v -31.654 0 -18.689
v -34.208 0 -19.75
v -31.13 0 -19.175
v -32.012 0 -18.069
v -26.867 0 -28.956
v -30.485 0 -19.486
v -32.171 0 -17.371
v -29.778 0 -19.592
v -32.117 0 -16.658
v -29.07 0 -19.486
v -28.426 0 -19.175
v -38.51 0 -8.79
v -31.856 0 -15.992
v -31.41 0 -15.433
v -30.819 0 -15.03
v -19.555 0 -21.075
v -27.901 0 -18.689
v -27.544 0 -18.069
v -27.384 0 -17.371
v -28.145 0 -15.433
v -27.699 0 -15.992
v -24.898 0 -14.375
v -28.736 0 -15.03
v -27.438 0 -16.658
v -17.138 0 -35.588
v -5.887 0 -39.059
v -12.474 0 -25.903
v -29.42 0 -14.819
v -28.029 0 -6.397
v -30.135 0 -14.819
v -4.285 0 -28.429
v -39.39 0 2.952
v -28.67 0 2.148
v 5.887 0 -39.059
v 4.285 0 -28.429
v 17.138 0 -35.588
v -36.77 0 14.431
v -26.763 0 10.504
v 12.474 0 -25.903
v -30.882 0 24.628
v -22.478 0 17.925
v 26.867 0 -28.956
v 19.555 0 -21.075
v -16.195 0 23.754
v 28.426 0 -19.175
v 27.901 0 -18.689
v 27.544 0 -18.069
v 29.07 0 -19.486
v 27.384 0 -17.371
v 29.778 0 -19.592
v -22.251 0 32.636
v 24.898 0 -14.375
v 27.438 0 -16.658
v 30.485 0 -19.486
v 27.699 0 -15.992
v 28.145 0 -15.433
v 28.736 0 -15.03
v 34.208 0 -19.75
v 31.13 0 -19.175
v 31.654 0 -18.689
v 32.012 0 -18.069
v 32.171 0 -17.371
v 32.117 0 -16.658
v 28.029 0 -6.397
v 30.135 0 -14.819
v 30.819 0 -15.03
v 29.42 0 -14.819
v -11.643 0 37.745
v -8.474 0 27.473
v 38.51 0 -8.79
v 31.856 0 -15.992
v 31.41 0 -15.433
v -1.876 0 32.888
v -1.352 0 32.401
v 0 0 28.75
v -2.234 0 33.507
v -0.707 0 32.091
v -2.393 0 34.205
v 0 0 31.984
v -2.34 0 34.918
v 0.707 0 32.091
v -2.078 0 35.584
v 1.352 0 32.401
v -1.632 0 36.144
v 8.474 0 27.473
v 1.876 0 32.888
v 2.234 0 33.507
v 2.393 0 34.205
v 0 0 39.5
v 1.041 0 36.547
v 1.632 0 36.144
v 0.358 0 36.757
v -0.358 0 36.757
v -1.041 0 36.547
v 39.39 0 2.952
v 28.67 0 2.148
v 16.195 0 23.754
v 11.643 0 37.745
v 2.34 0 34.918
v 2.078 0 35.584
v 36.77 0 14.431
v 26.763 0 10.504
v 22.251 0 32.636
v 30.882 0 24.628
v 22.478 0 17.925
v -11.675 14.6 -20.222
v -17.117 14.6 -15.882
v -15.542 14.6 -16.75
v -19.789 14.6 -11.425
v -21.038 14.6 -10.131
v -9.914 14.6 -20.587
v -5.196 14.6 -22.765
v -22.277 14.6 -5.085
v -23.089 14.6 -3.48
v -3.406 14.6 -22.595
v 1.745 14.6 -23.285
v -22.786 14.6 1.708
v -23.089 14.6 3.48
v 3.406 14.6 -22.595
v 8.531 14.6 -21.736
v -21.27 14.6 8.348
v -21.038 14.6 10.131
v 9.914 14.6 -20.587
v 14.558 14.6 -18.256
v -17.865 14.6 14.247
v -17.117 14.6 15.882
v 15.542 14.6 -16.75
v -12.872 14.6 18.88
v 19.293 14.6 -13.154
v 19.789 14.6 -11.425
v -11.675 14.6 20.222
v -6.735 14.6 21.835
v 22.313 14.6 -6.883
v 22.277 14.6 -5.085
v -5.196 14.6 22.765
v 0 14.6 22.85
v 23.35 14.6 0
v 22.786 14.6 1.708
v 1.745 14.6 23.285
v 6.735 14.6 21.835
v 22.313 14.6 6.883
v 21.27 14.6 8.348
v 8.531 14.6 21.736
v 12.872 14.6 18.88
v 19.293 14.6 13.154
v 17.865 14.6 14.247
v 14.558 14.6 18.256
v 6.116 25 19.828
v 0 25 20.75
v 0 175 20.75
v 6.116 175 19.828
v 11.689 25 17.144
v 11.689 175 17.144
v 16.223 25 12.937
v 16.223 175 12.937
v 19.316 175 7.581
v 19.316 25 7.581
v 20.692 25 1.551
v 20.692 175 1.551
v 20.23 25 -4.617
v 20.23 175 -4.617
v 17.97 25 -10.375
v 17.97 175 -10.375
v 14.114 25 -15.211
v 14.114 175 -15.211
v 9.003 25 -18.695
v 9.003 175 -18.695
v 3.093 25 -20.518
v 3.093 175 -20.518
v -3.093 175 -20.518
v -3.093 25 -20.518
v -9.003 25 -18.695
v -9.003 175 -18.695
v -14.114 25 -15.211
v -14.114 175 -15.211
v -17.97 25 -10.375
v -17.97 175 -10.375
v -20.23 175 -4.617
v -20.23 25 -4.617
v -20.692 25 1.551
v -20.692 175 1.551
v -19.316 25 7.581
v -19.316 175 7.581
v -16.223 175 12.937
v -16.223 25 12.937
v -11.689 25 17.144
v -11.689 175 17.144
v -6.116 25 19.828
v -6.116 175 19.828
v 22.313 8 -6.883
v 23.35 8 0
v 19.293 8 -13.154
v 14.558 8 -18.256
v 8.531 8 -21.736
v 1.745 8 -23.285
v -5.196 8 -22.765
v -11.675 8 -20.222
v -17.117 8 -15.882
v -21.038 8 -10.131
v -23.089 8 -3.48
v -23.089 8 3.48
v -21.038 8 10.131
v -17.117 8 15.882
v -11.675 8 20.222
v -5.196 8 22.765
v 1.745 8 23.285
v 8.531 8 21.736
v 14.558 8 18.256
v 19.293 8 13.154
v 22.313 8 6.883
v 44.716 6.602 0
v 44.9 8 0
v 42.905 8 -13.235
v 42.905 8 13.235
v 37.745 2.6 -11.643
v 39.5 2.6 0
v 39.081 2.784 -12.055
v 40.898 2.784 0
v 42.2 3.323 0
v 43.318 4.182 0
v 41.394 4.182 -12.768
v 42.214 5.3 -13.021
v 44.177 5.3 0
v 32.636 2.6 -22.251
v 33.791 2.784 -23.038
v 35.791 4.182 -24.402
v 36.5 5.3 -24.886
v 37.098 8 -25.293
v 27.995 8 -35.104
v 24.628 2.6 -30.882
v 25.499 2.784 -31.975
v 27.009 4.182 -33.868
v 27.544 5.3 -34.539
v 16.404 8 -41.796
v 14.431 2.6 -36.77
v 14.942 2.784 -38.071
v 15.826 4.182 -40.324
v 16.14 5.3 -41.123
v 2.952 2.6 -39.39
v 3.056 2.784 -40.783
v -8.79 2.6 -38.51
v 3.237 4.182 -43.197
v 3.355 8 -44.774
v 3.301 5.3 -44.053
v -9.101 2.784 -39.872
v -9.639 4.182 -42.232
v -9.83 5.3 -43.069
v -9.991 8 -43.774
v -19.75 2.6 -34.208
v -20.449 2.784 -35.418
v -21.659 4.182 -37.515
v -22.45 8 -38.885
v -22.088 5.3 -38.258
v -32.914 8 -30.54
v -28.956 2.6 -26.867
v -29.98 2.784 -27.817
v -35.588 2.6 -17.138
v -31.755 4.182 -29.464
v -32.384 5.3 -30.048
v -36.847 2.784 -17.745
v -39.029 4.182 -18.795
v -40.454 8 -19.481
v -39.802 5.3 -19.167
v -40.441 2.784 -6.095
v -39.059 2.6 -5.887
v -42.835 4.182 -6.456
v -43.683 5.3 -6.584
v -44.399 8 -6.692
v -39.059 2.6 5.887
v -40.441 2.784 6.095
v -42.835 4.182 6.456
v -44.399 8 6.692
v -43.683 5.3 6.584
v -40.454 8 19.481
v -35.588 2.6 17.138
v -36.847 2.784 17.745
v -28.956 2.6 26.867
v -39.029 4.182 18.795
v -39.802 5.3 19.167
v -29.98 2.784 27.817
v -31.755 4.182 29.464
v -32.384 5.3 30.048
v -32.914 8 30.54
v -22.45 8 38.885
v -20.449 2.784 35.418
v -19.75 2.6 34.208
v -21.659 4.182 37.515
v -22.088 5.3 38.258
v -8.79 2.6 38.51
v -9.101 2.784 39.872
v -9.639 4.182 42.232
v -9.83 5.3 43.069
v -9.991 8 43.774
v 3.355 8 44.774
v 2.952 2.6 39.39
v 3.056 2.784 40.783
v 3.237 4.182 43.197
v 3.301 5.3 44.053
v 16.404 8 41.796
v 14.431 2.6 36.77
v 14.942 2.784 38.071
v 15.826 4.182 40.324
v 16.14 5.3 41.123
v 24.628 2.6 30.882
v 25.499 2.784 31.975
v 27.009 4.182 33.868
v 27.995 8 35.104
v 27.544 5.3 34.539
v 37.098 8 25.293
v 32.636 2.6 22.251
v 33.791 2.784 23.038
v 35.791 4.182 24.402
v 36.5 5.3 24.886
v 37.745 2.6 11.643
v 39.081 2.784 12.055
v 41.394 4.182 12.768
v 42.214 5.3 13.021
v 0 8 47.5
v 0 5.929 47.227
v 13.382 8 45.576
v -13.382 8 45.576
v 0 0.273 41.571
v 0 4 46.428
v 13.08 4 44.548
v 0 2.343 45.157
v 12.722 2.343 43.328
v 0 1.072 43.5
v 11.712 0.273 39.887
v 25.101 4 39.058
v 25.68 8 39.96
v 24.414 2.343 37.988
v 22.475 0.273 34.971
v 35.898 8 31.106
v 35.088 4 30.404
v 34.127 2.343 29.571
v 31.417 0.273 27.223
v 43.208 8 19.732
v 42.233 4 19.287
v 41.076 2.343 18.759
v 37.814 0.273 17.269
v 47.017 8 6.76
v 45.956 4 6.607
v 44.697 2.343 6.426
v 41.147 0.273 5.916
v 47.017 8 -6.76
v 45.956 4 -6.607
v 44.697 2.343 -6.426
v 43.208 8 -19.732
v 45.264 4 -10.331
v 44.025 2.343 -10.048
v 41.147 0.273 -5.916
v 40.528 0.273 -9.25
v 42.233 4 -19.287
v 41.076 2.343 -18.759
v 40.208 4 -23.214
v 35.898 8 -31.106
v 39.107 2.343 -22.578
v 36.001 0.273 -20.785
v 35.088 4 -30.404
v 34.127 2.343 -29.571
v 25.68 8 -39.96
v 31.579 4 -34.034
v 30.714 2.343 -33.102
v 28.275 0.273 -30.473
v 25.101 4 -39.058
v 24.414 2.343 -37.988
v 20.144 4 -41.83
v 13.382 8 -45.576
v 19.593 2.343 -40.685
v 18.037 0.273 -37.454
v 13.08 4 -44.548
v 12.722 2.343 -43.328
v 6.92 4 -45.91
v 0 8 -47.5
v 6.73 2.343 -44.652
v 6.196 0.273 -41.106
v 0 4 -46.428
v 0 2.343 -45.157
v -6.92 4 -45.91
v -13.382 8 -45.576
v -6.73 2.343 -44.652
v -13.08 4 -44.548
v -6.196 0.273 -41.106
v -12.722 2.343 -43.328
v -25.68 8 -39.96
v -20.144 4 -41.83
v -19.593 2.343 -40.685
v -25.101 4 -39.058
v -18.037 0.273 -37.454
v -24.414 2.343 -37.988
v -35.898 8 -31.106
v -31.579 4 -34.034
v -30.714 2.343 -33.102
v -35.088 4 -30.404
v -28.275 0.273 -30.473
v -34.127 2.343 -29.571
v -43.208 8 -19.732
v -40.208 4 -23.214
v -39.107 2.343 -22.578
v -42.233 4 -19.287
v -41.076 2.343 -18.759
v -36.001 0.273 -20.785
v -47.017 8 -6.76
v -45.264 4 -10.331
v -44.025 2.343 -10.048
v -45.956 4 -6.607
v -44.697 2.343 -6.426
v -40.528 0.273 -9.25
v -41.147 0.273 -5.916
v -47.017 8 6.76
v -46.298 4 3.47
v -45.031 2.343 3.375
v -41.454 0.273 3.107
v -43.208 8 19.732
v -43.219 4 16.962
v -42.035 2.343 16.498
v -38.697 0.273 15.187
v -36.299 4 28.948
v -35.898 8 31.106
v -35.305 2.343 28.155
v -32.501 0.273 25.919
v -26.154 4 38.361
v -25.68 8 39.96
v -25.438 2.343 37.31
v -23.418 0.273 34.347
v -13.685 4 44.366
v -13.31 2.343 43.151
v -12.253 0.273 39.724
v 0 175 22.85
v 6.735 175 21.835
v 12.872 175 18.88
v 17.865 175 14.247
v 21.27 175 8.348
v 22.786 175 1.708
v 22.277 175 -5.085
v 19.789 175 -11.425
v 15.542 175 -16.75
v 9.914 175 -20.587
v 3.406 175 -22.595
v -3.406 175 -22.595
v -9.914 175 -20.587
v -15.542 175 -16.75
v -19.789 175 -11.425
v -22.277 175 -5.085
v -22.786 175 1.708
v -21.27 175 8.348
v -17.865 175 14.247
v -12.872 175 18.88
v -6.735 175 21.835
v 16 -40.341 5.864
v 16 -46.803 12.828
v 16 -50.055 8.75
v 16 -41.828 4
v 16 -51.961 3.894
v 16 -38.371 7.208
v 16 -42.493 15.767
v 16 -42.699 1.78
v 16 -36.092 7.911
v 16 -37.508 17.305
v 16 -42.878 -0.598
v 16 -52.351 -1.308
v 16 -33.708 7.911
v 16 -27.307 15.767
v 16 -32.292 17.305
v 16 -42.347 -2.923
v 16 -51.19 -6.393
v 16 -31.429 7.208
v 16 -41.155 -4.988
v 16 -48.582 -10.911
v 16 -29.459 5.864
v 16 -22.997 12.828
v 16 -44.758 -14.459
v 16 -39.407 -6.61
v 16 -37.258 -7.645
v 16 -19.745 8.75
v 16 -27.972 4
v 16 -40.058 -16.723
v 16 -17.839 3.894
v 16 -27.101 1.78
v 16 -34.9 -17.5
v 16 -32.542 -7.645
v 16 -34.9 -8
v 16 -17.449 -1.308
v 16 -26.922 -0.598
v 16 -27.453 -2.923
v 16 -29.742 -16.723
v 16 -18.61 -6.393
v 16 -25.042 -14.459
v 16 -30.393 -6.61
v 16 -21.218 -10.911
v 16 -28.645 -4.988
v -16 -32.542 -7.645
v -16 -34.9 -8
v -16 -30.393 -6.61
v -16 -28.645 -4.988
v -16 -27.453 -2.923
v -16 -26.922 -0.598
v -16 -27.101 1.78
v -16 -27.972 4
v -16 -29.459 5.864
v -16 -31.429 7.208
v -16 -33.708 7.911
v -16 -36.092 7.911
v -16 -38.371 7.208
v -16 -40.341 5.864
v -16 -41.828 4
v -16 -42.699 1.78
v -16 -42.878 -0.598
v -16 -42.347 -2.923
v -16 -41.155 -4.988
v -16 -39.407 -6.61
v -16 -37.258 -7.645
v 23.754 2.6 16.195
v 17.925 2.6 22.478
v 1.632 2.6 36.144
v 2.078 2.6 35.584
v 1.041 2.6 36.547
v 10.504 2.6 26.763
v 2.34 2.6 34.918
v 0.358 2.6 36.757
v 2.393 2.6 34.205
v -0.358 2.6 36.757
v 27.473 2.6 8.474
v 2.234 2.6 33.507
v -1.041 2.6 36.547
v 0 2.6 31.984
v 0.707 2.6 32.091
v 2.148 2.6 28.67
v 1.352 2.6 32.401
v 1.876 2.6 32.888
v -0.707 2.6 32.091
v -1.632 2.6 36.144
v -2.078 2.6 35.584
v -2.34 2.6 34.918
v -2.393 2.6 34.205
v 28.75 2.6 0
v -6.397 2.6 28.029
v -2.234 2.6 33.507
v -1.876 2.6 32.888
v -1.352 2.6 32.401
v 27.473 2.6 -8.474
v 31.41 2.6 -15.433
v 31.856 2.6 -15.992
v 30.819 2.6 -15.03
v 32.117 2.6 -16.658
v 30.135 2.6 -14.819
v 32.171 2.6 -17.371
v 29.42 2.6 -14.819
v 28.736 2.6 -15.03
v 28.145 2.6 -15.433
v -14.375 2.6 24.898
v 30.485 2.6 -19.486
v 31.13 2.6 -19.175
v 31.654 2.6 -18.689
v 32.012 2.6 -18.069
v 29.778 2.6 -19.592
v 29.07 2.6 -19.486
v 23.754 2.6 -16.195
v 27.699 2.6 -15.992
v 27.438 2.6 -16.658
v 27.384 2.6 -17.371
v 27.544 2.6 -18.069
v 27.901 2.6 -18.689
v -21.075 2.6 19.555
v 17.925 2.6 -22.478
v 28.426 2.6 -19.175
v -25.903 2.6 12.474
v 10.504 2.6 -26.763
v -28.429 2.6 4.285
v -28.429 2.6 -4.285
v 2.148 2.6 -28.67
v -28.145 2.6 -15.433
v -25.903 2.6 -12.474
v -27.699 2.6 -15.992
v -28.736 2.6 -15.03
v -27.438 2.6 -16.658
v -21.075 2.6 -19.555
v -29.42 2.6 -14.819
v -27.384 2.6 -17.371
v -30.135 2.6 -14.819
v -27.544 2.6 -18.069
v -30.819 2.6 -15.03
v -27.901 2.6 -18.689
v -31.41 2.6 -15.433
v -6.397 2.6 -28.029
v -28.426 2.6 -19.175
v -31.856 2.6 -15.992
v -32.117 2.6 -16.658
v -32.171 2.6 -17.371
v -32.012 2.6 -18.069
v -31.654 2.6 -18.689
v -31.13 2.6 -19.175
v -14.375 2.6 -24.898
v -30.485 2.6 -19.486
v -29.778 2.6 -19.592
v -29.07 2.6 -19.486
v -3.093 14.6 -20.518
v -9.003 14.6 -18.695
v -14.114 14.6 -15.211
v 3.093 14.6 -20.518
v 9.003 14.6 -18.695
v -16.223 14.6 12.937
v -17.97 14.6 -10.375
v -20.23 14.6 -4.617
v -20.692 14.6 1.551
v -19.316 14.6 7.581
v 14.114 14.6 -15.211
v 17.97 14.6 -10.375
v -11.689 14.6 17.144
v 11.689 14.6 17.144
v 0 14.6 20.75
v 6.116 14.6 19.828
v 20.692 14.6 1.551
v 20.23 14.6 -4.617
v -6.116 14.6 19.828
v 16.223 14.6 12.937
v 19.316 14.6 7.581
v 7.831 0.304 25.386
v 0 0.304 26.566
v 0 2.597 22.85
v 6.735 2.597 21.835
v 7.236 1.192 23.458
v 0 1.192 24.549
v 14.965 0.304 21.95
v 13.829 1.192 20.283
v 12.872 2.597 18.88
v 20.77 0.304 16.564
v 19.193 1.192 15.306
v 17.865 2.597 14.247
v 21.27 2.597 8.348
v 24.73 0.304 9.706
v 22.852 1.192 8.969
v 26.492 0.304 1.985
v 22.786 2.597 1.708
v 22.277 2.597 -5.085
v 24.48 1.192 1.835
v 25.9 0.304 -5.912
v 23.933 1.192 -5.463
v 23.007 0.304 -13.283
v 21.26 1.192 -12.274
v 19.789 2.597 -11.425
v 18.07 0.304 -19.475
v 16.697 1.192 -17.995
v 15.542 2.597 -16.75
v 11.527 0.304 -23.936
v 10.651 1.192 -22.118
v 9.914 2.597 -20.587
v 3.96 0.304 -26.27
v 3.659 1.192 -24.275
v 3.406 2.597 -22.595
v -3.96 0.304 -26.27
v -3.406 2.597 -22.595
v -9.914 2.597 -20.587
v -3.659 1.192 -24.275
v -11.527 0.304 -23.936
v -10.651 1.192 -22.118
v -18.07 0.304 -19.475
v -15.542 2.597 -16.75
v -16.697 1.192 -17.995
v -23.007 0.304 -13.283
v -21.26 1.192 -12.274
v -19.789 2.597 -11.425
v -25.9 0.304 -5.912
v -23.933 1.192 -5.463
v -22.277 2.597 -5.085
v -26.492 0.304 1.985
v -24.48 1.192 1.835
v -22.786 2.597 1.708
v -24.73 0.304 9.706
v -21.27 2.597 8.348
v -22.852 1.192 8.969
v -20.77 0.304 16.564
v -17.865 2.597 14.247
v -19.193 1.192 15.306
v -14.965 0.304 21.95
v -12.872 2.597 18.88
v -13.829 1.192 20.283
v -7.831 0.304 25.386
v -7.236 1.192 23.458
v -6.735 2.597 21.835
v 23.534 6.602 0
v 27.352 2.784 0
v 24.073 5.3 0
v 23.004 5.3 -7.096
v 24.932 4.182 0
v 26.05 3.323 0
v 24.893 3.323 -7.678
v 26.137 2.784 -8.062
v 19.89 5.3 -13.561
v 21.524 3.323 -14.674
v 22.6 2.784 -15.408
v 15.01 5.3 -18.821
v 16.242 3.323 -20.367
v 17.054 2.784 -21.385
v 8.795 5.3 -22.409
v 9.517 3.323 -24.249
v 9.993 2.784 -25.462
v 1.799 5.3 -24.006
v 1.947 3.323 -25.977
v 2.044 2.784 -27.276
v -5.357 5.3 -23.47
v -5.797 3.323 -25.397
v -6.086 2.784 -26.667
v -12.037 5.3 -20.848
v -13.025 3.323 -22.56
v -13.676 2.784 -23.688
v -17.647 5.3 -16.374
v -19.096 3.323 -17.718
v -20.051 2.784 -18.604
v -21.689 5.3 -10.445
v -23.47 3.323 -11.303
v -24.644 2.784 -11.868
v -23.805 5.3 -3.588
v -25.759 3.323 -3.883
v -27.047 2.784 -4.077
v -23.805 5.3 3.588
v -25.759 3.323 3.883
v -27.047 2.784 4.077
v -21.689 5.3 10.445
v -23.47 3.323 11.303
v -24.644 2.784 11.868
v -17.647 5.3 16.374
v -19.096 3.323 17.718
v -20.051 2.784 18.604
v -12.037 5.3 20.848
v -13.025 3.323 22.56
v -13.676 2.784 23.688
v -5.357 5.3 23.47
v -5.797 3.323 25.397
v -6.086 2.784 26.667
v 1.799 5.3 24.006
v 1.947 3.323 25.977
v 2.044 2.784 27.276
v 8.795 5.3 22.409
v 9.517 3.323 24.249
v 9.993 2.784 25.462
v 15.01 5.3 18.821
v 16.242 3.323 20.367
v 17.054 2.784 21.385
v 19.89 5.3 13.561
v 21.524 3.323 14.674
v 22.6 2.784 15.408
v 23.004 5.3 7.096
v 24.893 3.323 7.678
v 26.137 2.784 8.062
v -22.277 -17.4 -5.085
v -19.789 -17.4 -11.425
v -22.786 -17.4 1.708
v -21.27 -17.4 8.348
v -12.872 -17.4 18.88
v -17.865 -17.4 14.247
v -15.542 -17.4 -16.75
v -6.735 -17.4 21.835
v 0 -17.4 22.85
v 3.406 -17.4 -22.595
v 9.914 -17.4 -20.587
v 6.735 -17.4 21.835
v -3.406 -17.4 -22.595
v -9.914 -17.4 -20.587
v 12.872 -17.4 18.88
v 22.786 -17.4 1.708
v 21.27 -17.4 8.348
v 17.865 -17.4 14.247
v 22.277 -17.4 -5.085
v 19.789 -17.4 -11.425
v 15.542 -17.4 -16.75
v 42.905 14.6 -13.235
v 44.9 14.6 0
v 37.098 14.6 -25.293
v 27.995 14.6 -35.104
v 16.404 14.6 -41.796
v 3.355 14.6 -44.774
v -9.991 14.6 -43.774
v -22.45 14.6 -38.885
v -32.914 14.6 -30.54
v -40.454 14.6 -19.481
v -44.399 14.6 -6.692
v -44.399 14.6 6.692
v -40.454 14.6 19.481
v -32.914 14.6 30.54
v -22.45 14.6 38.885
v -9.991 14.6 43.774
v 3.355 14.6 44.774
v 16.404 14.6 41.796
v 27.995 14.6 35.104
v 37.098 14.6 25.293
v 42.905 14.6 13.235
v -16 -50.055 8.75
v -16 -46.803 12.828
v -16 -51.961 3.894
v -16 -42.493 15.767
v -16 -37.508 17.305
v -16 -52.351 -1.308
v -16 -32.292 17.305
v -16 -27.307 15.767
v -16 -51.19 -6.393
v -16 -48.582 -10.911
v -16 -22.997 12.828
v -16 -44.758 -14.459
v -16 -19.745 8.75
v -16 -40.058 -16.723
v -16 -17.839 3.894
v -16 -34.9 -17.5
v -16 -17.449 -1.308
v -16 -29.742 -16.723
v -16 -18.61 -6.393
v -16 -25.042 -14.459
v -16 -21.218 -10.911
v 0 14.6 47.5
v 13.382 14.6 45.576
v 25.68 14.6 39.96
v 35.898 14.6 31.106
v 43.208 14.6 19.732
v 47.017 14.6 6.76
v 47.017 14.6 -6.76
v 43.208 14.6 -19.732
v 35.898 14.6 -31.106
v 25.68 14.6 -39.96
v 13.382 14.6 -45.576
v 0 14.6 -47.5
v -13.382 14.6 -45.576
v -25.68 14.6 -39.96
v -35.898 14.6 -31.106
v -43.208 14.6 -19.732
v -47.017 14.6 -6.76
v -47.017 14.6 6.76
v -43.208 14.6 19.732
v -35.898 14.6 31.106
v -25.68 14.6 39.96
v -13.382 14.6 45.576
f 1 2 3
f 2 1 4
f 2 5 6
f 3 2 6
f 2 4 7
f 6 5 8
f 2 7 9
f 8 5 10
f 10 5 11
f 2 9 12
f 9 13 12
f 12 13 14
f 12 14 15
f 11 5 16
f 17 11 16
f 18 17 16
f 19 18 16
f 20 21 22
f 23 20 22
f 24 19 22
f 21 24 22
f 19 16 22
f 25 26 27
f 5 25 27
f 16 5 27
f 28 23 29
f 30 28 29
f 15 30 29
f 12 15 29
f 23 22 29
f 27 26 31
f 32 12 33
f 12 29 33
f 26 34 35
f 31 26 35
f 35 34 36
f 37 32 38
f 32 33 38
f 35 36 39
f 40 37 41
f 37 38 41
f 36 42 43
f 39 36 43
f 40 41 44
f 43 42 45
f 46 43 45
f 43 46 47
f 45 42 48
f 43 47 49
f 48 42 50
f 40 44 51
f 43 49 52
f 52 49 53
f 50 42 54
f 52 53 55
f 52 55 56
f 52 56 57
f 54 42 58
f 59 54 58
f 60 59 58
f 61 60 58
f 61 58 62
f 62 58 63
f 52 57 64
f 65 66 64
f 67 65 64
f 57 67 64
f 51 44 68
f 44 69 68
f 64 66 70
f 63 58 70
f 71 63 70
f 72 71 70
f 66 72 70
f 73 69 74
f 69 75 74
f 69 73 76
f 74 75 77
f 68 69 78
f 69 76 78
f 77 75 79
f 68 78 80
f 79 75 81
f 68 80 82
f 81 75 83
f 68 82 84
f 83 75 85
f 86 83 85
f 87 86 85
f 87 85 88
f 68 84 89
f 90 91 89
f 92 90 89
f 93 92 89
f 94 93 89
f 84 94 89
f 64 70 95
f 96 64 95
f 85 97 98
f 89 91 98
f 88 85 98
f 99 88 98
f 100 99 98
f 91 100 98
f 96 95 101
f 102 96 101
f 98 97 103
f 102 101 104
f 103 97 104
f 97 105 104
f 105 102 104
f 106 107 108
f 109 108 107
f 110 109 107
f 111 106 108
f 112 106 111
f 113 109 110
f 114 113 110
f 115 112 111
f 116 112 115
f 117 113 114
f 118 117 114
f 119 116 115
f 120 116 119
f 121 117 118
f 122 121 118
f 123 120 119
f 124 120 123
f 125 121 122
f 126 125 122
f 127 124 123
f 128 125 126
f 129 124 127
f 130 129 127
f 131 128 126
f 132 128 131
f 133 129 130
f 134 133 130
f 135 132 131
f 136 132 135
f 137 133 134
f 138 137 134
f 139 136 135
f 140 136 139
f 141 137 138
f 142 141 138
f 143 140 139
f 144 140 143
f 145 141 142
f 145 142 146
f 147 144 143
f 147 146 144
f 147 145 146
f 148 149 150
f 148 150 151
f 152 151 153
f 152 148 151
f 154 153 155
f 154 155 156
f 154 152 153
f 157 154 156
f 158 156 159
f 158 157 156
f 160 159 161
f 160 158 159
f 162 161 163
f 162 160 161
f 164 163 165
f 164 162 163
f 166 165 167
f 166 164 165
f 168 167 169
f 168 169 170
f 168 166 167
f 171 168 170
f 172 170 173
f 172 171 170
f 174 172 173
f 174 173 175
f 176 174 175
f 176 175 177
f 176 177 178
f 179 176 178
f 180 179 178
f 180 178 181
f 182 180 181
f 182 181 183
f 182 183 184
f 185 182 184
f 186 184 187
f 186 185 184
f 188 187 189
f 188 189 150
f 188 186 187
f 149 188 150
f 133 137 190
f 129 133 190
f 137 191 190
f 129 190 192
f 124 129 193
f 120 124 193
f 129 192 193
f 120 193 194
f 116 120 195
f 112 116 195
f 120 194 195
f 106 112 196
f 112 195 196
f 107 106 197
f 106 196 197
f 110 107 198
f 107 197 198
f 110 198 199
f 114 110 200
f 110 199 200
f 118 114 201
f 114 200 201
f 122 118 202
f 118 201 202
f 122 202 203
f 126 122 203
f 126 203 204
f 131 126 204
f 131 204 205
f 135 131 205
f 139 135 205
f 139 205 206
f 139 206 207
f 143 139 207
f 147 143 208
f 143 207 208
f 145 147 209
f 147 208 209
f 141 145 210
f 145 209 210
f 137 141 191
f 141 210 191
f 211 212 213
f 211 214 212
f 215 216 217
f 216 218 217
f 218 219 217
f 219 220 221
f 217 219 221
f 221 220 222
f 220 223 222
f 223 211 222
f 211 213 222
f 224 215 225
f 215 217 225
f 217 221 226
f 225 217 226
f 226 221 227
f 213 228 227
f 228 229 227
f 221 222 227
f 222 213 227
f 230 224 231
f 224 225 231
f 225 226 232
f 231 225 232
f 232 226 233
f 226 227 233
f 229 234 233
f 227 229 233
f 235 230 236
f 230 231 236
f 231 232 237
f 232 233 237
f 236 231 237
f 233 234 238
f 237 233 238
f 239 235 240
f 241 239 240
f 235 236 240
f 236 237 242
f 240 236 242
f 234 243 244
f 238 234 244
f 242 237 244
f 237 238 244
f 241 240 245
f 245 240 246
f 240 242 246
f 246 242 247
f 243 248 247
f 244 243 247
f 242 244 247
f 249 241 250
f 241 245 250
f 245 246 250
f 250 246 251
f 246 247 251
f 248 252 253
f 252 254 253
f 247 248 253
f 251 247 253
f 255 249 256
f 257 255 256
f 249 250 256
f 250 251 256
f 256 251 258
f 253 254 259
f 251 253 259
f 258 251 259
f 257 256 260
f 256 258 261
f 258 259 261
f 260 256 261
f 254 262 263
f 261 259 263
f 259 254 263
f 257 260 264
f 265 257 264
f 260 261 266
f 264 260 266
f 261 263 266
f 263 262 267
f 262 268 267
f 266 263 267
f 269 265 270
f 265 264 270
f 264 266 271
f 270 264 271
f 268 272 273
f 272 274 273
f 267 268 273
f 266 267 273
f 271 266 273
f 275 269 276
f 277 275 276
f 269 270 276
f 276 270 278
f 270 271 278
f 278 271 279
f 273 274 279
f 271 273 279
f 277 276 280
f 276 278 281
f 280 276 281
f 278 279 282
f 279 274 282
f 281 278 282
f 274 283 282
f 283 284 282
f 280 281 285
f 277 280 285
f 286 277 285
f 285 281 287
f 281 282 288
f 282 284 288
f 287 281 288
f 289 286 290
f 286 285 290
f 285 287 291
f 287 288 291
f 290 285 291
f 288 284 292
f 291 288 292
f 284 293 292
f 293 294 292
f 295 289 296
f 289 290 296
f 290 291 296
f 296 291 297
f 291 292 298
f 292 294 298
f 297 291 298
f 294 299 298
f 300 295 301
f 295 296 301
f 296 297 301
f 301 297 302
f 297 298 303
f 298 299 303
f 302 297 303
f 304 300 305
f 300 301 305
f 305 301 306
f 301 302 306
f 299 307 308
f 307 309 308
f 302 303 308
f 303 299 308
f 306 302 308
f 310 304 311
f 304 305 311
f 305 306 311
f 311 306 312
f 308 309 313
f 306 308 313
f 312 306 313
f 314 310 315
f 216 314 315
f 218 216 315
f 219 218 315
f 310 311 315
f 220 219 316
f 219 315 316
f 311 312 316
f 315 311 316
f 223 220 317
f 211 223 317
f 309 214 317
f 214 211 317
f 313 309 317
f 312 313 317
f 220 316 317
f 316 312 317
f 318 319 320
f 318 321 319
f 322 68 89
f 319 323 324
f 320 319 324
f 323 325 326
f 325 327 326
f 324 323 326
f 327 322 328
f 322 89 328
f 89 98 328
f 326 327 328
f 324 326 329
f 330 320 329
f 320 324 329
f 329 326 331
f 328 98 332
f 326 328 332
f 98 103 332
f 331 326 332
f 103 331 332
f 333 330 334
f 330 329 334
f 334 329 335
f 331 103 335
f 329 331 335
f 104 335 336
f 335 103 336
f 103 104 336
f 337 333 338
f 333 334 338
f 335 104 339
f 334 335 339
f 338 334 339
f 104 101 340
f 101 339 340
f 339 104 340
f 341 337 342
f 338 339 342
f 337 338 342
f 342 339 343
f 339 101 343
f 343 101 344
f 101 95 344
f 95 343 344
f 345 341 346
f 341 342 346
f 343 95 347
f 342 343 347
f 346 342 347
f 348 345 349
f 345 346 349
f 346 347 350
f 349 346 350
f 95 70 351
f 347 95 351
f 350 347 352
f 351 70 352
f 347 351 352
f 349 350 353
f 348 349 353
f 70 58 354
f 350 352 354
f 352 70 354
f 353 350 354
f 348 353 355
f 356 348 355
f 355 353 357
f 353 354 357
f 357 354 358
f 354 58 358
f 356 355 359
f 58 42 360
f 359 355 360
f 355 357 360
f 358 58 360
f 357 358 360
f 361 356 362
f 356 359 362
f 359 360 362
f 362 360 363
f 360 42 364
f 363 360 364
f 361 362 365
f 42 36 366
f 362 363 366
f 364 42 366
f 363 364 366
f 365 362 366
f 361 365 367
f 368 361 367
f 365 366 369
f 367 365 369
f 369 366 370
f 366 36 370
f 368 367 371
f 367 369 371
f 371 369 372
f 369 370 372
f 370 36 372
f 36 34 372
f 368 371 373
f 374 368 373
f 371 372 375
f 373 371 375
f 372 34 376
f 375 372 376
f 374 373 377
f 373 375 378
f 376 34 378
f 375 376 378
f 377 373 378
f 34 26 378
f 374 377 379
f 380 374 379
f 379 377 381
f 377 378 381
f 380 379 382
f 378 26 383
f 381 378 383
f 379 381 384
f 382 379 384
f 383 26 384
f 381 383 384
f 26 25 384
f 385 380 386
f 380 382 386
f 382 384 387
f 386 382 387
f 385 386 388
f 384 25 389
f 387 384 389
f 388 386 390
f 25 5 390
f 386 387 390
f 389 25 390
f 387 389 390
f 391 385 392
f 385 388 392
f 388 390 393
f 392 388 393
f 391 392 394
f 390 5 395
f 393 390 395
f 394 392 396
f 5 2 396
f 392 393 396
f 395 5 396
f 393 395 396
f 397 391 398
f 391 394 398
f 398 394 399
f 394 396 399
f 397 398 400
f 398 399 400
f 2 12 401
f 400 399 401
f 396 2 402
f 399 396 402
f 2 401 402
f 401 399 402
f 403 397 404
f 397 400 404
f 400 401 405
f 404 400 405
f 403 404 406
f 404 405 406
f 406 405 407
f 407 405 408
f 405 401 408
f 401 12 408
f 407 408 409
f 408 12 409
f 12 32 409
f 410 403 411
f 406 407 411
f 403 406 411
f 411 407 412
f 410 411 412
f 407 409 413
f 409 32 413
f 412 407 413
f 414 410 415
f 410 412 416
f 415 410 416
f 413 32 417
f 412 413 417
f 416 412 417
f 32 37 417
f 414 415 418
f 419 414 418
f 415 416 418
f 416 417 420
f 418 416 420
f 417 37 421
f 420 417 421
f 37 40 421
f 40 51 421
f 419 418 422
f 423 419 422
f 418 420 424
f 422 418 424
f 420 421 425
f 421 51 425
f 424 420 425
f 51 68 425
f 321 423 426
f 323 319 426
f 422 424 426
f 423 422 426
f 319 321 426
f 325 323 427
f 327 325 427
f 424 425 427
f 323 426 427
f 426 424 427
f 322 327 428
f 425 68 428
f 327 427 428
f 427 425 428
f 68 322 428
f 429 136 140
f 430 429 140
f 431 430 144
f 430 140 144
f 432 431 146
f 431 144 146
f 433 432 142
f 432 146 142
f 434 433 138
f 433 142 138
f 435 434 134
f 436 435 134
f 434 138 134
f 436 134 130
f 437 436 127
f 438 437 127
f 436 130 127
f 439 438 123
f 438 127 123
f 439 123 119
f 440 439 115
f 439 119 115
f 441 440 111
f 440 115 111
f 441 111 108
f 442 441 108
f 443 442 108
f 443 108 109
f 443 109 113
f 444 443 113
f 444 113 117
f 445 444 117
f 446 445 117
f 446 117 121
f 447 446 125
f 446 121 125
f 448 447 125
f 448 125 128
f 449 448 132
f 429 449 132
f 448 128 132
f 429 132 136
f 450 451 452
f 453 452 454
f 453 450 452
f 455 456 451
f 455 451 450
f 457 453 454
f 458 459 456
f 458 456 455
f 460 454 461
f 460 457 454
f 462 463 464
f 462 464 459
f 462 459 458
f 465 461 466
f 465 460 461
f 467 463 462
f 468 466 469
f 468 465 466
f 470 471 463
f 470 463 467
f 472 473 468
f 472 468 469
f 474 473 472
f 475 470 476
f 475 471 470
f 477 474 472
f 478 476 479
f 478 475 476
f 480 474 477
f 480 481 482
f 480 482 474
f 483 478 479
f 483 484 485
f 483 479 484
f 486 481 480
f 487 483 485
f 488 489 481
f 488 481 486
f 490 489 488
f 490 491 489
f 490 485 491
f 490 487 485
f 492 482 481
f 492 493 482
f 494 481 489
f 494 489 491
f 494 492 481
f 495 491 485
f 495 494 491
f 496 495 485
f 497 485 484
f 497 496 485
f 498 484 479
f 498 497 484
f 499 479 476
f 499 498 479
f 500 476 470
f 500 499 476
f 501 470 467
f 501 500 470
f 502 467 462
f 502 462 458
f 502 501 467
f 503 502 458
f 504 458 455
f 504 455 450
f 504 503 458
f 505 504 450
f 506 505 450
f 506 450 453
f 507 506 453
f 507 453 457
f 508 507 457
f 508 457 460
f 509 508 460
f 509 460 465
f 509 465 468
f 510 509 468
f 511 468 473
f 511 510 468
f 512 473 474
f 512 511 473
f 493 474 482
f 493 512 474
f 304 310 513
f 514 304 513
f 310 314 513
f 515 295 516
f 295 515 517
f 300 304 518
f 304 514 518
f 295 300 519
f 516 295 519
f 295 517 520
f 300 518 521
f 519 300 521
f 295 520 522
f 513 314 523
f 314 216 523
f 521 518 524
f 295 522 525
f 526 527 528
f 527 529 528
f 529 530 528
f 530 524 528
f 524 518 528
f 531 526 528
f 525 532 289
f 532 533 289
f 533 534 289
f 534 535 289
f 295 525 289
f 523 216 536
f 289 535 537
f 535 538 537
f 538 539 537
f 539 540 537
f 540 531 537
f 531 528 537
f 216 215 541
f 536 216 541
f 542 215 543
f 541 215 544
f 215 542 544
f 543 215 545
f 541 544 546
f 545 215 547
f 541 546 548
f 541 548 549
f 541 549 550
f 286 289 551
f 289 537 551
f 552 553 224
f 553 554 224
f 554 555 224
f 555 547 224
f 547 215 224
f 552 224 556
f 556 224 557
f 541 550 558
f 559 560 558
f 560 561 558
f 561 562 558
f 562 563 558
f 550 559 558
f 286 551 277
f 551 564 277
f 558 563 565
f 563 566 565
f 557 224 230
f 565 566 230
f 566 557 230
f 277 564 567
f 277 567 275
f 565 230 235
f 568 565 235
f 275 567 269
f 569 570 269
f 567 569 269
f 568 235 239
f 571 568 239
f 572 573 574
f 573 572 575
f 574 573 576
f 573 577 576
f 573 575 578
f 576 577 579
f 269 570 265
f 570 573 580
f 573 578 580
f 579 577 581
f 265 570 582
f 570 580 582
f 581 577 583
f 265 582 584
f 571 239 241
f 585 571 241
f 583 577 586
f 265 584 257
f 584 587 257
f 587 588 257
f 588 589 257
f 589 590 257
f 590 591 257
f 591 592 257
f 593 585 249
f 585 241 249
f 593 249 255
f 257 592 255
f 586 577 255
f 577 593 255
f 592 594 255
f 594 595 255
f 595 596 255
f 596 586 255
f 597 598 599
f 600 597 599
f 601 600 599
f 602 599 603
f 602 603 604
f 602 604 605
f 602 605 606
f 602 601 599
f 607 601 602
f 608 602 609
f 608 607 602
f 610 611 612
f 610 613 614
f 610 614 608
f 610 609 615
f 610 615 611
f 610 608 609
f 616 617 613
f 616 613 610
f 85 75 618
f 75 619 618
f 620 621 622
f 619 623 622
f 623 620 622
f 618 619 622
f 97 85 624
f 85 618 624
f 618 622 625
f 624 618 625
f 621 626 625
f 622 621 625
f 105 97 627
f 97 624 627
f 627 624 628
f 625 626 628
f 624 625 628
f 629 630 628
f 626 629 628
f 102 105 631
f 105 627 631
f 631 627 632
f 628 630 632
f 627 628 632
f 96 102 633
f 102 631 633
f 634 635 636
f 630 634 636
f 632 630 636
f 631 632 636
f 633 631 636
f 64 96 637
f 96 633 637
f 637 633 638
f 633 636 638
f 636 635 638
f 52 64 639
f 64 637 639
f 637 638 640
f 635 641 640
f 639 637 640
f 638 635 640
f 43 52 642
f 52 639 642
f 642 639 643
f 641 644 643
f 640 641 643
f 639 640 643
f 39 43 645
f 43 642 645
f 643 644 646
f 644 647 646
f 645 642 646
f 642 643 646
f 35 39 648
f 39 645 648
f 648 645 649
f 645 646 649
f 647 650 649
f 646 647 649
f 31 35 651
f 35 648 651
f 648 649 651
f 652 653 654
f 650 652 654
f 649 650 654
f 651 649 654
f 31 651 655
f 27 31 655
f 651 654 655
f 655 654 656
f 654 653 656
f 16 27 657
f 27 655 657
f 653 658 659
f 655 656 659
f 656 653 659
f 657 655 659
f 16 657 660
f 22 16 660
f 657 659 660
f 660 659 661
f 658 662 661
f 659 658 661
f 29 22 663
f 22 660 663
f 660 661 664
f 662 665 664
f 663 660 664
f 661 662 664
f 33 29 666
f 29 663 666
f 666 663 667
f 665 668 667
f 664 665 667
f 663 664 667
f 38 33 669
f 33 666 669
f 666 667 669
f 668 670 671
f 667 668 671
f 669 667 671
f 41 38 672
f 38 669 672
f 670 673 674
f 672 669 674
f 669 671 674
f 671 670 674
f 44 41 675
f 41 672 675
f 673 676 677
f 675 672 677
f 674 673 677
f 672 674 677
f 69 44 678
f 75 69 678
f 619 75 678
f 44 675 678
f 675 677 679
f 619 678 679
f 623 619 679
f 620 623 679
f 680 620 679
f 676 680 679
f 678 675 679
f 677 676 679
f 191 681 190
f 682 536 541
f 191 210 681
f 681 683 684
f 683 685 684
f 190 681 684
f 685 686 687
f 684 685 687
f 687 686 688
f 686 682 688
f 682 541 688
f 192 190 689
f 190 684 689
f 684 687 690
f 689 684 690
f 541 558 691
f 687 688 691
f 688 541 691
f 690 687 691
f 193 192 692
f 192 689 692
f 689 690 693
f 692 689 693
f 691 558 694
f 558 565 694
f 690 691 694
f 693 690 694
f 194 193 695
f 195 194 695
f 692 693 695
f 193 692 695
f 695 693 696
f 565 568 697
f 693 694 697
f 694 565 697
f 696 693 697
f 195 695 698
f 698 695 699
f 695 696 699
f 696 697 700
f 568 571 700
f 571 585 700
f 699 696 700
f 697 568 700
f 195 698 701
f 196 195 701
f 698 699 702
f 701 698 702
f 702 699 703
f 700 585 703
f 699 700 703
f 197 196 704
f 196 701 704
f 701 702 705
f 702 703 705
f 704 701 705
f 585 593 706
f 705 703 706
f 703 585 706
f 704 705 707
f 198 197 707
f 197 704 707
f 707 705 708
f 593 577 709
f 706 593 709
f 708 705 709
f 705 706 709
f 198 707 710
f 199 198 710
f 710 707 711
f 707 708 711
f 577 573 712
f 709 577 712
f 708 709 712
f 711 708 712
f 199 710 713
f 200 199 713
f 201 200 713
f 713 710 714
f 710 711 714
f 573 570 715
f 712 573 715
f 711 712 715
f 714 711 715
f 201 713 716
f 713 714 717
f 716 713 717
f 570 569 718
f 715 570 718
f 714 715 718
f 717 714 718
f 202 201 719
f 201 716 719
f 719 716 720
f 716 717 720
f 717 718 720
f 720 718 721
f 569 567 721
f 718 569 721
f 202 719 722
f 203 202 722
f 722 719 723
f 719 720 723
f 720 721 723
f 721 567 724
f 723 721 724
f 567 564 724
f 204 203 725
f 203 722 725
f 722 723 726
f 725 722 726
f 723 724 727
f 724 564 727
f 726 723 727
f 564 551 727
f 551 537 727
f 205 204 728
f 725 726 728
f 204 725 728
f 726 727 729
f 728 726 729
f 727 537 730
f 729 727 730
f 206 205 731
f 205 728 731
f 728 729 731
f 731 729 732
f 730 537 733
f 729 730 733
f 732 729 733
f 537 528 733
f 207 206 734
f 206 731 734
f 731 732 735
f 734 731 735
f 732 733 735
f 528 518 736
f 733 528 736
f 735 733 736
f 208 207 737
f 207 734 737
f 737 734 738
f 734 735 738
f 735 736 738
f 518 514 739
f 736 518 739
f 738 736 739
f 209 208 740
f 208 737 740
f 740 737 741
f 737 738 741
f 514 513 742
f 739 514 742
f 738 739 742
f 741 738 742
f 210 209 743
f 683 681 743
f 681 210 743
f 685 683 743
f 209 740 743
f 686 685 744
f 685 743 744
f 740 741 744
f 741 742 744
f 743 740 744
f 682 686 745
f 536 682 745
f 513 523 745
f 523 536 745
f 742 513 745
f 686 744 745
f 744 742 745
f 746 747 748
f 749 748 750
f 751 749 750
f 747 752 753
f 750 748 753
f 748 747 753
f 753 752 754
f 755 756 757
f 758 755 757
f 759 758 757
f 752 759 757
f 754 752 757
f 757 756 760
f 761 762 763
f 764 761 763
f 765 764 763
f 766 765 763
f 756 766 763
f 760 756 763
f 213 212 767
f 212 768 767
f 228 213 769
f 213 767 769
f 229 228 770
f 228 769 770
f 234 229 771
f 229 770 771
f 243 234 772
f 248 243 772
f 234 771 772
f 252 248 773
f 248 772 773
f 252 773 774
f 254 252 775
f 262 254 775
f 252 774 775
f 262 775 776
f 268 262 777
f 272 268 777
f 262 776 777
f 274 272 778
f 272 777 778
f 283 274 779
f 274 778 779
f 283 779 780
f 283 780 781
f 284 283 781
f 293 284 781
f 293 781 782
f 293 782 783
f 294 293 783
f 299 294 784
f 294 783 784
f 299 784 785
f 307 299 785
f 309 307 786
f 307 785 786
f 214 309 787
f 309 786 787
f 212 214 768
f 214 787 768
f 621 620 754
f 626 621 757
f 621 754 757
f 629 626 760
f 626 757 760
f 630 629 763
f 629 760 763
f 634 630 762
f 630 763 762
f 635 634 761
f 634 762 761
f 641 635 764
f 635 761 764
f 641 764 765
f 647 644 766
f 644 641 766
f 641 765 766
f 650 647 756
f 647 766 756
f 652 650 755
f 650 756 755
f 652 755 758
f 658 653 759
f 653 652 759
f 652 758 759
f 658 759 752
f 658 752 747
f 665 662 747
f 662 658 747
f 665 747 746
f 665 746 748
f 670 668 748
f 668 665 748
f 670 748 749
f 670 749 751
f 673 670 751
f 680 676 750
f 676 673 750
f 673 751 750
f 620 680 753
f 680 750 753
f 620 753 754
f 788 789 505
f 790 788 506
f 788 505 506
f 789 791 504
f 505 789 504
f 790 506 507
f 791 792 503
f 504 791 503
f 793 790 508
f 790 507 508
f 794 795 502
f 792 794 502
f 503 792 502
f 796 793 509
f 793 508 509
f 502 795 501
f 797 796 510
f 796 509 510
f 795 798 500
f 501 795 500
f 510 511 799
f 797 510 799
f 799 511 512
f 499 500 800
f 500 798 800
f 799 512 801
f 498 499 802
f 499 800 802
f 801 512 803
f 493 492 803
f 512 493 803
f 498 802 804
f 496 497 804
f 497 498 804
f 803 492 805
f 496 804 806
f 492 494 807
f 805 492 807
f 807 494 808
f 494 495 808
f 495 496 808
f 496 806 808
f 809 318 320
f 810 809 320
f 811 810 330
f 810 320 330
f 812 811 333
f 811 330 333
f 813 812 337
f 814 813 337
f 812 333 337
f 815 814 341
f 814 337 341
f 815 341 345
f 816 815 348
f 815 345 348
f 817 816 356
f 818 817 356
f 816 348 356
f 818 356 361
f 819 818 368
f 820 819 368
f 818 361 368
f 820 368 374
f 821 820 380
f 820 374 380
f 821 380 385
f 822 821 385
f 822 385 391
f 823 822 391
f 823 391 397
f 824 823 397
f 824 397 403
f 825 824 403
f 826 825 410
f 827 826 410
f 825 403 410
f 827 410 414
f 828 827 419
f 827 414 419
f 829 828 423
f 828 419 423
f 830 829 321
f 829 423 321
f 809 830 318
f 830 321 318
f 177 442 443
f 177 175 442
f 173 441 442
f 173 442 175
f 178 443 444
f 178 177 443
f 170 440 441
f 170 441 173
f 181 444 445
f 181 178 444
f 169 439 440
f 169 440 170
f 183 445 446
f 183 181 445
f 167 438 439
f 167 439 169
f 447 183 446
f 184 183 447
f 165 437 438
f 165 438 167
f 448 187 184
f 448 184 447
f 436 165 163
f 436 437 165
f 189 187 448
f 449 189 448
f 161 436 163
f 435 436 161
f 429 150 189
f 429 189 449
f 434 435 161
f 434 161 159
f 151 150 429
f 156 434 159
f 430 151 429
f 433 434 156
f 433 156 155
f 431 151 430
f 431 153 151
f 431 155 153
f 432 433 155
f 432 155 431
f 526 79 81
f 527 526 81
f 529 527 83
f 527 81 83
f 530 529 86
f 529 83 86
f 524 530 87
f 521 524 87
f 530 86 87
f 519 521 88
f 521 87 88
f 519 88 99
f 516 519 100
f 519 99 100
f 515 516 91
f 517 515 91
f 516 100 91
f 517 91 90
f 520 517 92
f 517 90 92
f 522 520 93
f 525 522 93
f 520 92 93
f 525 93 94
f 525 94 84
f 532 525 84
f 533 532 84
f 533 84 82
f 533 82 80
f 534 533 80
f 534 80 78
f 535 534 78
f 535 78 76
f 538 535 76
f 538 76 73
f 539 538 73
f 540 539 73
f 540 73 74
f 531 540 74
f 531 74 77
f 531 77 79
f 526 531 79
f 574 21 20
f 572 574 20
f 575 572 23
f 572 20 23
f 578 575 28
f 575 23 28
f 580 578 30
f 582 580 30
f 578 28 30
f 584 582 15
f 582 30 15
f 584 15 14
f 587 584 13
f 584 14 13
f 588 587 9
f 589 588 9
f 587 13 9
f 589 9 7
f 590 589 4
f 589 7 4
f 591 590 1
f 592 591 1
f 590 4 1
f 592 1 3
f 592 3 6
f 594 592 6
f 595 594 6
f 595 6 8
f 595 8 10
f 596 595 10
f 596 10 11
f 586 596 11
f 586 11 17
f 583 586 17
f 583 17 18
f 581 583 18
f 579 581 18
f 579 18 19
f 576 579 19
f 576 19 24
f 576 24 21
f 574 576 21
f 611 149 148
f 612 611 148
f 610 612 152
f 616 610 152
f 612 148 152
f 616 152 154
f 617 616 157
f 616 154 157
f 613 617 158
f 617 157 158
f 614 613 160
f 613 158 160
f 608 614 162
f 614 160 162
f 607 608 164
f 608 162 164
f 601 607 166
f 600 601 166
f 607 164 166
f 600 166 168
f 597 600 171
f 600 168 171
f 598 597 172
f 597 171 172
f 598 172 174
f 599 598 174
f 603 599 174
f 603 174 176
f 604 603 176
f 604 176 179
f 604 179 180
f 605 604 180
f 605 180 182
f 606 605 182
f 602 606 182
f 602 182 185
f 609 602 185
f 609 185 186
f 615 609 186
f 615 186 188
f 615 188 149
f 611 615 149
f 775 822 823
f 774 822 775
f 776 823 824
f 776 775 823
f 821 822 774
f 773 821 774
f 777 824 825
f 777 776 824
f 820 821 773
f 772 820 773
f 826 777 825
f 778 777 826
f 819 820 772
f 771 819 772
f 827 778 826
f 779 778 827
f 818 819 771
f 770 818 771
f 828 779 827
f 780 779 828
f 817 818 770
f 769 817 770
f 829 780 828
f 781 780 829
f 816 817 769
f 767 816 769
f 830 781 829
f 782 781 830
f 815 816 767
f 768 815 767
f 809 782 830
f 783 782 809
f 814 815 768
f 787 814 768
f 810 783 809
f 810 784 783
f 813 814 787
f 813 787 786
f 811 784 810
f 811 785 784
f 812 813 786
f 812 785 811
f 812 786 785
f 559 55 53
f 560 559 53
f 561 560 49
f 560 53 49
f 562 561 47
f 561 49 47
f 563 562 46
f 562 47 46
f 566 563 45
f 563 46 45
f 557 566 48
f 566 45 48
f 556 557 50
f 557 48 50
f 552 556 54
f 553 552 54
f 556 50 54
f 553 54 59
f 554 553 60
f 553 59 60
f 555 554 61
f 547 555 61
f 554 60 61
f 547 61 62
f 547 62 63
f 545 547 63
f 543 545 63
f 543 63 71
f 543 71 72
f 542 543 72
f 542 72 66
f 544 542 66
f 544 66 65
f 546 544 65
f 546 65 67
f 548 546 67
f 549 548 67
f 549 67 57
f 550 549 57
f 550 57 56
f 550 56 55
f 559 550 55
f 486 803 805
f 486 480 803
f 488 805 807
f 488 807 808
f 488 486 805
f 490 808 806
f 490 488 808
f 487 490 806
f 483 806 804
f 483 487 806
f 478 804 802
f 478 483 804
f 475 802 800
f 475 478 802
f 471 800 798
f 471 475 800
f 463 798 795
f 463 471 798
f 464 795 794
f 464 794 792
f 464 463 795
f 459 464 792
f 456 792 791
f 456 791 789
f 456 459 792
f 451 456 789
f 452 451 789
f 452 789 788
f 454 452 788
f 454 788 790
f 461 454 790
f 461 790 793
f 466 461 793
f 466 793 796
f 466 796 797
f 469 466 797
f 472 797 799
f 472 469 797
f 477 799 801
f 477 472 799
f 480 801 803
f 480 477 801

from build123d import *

# Parameters (mm, degrees)
SKETCH1_R           = 47.5
BOSS_EXTRUDE2_DEPTH = 14.6
SKETCH4_R           = 22.85
BOSS_EXTRUDE3_DEPTH = 10.4
SKETCH5_R           = 20.75
CUT_EXTRUDE3_DEPTH  = 72.676355934
FILLET2_R           = 8
FILLET3_R           = 8
SKETCH6_R           = 2.4
CUT_EXTRUDE4_DEPTH  = 72.676355934
CIRPATTERN1_COUNT   = 3
SKETCH7_R           = 22.85
SKETCH7_R_2         = 20.75
BOSS_EXTRUDE4_DEPTH = 150
BOSS_EXTRUDE5_START = -32
SKETCH4_2_R         = 22.85
BOSS_EXTRUDE5_DEPTH = 32
SKETCH8_R           = 17.5
SKETCH8_R_2         = 8
BOSS_EXTRUDE6_DEPTH = 16


# Read off the part's stored shape, not the designer's step: Shell2
with BuildPart() as part:
    # Sketch1 → Boss-Extrude2 (new body)
    with BuildSketch(Plane(origin=(0, 0, 0), x_dir=(1, 0, 0), z_dir=(0, 1, 0))):
        with Locations(Location((0, 0, 0), (0, 0, 270))):
            Circle(SKETCH1_R)
    extrude(amount=BOSS_EXTRUDE2_DEPTH)

    # Sketch4 → Boss-Extrude3 (add)
    with BuildSketch(Plane(origin=(0, 14.6, 0), x_dir=(1, 0, 0), z_dir=(0, 1, 0))):
        with Locations(Location((0, 0, 0), (0, 0, 270))):
            Circle(SKETCH4_R)
    extrude(amount=BOSS_EXTRUDE3_DEPTH)

    # Sketch5 → Cut-Extrude3 (cut, through all)
    with BuildSketch(Plane(origin=(0, 25, 0), x_dir=(1, 0, 0), z_dir=(0, 1, 0))):
        with Locations(Location((0, 0, 0), (0, 0, 270))):
            Circle(SKETCH5_R)
    extrude(amount=-CUT_EXTRUDE3_DEPTH, mode=Mode.SUBTRACT)

    # Fillet2
    fillet2_edges = [part.edges().sort_by_distance(p)[0] for p in [
        (0, 0, -47.5),
    ]]
    fillet(fillet2_edges, radius=FILLET2_R)

    # Fillet3
    fillet3_edges = [part.edges().sort_by_distance(p)[0] for p in [
        (0, 0, -20.75),
    ]]
    fillet(fillet3_edges, radius=FILLET3_R)

    # Shell2 outline → Shell2 (revolve, cut)
    with BuildSketch(Plane.XY):
        with BuildLine():
            Line((44.9, 8), (44.9, 14.6))
            Line((44.9, 14.6), (23.35, 14.6))
            Line((23.35, 14.6), (23.35, 8))
            ThreePointArc((23.35, 8), (24.931623382, 4.181623382), (28.75, 2.6))
            Line((28.75, 2.6), (39.5, 2.6))
            ThreePointArc((39.5, 2.6), (43.318376618, 4.181623382), (44.9, 8))
        make_face()
    revolve(axis=Axis((0, 0, 0), (0, 1, 0)), mode=Mode.SUBTRACT)

    # Sketch6 → Cut-Extrude4 (cut, through all)
    with BuildSketch(Plane(origin=(0, 0, 0), x_dir=(-1, 0, 0), z_dir=(0, -1, 0))):
        with Locations(Location((0, -34.384260124, 0), (0, 0, 90))):
            Circle(SKETCH6_R)
    cut_extrude4 = extrude(amount=-CUT_EXTRUDE4_DEPTH, mode=Mode.SUBTRACT)

    # CirPattern1: Cut-Extrude4 ×3 about axis
    cirpattern1_axis = Axis((0, 0, 0), (0, 1, 0))
    for i in range(1, CIRPATTERN1_COUNT):
        add(cut_extrude4.rotate(cirpattern1_axis, i * 360 / CIRPATTERN1_COUNT), mode=Mode.SUBTRACT)

    # Sketch7 → Boss-Extrude4 (add)
    with BuildSketch(Plane(origin=(0, 25, 0), x_dir=(1, 0, 0), z_dir=(0, 1, 0))):
        with Locations(Location((0, 0, 0), (0, 0, 270))):
            Circle(SKETCH7_R)
        with Locations(Location((0, 0, 0), (0, 0, 270))):
            Circle(SKETCH7_R_2, mode=Mode.SUBTRACT)
    extrude(amount=BOSS_EXTRUDE4_DEPTH)

    # Sketch4<2> → Boss-Extrude5 (add)
    with BuildSketch(Plane(origin=(0, 14.6, 0), x_dir=(1, 0, 0), z_dir=(0, 1, 0)).offset(BOSS_EXTRUDE5_START)):
        with Locations(Location((0, 0, 0), (0, 0, 270))):
            Circle(SKETCH4_2_R)
    extrude(amount=BOSS_EXTRUDE5_DEPTH)


with BuildPart() as body_2:
    # Sketch8 → Boss-Extrude6 (new, symmetric)
    with BuildSketch(Plane(origin=(0, 0, 0), x_dir=(0, 0, -1), z_dir=(1, 0, 0))):
        with Locations((0, -34.9)):
            Circle(SKETCH8_R)
        with Locations((0, -34.9)):
            Circle(SKETCH8_R_2, mode=Mode.SUBTRACT)
    extrude(amount=BOSS_EXTRUDE6_DEPTH, both=True)


solid = Compound([part.part, body_2.part])
